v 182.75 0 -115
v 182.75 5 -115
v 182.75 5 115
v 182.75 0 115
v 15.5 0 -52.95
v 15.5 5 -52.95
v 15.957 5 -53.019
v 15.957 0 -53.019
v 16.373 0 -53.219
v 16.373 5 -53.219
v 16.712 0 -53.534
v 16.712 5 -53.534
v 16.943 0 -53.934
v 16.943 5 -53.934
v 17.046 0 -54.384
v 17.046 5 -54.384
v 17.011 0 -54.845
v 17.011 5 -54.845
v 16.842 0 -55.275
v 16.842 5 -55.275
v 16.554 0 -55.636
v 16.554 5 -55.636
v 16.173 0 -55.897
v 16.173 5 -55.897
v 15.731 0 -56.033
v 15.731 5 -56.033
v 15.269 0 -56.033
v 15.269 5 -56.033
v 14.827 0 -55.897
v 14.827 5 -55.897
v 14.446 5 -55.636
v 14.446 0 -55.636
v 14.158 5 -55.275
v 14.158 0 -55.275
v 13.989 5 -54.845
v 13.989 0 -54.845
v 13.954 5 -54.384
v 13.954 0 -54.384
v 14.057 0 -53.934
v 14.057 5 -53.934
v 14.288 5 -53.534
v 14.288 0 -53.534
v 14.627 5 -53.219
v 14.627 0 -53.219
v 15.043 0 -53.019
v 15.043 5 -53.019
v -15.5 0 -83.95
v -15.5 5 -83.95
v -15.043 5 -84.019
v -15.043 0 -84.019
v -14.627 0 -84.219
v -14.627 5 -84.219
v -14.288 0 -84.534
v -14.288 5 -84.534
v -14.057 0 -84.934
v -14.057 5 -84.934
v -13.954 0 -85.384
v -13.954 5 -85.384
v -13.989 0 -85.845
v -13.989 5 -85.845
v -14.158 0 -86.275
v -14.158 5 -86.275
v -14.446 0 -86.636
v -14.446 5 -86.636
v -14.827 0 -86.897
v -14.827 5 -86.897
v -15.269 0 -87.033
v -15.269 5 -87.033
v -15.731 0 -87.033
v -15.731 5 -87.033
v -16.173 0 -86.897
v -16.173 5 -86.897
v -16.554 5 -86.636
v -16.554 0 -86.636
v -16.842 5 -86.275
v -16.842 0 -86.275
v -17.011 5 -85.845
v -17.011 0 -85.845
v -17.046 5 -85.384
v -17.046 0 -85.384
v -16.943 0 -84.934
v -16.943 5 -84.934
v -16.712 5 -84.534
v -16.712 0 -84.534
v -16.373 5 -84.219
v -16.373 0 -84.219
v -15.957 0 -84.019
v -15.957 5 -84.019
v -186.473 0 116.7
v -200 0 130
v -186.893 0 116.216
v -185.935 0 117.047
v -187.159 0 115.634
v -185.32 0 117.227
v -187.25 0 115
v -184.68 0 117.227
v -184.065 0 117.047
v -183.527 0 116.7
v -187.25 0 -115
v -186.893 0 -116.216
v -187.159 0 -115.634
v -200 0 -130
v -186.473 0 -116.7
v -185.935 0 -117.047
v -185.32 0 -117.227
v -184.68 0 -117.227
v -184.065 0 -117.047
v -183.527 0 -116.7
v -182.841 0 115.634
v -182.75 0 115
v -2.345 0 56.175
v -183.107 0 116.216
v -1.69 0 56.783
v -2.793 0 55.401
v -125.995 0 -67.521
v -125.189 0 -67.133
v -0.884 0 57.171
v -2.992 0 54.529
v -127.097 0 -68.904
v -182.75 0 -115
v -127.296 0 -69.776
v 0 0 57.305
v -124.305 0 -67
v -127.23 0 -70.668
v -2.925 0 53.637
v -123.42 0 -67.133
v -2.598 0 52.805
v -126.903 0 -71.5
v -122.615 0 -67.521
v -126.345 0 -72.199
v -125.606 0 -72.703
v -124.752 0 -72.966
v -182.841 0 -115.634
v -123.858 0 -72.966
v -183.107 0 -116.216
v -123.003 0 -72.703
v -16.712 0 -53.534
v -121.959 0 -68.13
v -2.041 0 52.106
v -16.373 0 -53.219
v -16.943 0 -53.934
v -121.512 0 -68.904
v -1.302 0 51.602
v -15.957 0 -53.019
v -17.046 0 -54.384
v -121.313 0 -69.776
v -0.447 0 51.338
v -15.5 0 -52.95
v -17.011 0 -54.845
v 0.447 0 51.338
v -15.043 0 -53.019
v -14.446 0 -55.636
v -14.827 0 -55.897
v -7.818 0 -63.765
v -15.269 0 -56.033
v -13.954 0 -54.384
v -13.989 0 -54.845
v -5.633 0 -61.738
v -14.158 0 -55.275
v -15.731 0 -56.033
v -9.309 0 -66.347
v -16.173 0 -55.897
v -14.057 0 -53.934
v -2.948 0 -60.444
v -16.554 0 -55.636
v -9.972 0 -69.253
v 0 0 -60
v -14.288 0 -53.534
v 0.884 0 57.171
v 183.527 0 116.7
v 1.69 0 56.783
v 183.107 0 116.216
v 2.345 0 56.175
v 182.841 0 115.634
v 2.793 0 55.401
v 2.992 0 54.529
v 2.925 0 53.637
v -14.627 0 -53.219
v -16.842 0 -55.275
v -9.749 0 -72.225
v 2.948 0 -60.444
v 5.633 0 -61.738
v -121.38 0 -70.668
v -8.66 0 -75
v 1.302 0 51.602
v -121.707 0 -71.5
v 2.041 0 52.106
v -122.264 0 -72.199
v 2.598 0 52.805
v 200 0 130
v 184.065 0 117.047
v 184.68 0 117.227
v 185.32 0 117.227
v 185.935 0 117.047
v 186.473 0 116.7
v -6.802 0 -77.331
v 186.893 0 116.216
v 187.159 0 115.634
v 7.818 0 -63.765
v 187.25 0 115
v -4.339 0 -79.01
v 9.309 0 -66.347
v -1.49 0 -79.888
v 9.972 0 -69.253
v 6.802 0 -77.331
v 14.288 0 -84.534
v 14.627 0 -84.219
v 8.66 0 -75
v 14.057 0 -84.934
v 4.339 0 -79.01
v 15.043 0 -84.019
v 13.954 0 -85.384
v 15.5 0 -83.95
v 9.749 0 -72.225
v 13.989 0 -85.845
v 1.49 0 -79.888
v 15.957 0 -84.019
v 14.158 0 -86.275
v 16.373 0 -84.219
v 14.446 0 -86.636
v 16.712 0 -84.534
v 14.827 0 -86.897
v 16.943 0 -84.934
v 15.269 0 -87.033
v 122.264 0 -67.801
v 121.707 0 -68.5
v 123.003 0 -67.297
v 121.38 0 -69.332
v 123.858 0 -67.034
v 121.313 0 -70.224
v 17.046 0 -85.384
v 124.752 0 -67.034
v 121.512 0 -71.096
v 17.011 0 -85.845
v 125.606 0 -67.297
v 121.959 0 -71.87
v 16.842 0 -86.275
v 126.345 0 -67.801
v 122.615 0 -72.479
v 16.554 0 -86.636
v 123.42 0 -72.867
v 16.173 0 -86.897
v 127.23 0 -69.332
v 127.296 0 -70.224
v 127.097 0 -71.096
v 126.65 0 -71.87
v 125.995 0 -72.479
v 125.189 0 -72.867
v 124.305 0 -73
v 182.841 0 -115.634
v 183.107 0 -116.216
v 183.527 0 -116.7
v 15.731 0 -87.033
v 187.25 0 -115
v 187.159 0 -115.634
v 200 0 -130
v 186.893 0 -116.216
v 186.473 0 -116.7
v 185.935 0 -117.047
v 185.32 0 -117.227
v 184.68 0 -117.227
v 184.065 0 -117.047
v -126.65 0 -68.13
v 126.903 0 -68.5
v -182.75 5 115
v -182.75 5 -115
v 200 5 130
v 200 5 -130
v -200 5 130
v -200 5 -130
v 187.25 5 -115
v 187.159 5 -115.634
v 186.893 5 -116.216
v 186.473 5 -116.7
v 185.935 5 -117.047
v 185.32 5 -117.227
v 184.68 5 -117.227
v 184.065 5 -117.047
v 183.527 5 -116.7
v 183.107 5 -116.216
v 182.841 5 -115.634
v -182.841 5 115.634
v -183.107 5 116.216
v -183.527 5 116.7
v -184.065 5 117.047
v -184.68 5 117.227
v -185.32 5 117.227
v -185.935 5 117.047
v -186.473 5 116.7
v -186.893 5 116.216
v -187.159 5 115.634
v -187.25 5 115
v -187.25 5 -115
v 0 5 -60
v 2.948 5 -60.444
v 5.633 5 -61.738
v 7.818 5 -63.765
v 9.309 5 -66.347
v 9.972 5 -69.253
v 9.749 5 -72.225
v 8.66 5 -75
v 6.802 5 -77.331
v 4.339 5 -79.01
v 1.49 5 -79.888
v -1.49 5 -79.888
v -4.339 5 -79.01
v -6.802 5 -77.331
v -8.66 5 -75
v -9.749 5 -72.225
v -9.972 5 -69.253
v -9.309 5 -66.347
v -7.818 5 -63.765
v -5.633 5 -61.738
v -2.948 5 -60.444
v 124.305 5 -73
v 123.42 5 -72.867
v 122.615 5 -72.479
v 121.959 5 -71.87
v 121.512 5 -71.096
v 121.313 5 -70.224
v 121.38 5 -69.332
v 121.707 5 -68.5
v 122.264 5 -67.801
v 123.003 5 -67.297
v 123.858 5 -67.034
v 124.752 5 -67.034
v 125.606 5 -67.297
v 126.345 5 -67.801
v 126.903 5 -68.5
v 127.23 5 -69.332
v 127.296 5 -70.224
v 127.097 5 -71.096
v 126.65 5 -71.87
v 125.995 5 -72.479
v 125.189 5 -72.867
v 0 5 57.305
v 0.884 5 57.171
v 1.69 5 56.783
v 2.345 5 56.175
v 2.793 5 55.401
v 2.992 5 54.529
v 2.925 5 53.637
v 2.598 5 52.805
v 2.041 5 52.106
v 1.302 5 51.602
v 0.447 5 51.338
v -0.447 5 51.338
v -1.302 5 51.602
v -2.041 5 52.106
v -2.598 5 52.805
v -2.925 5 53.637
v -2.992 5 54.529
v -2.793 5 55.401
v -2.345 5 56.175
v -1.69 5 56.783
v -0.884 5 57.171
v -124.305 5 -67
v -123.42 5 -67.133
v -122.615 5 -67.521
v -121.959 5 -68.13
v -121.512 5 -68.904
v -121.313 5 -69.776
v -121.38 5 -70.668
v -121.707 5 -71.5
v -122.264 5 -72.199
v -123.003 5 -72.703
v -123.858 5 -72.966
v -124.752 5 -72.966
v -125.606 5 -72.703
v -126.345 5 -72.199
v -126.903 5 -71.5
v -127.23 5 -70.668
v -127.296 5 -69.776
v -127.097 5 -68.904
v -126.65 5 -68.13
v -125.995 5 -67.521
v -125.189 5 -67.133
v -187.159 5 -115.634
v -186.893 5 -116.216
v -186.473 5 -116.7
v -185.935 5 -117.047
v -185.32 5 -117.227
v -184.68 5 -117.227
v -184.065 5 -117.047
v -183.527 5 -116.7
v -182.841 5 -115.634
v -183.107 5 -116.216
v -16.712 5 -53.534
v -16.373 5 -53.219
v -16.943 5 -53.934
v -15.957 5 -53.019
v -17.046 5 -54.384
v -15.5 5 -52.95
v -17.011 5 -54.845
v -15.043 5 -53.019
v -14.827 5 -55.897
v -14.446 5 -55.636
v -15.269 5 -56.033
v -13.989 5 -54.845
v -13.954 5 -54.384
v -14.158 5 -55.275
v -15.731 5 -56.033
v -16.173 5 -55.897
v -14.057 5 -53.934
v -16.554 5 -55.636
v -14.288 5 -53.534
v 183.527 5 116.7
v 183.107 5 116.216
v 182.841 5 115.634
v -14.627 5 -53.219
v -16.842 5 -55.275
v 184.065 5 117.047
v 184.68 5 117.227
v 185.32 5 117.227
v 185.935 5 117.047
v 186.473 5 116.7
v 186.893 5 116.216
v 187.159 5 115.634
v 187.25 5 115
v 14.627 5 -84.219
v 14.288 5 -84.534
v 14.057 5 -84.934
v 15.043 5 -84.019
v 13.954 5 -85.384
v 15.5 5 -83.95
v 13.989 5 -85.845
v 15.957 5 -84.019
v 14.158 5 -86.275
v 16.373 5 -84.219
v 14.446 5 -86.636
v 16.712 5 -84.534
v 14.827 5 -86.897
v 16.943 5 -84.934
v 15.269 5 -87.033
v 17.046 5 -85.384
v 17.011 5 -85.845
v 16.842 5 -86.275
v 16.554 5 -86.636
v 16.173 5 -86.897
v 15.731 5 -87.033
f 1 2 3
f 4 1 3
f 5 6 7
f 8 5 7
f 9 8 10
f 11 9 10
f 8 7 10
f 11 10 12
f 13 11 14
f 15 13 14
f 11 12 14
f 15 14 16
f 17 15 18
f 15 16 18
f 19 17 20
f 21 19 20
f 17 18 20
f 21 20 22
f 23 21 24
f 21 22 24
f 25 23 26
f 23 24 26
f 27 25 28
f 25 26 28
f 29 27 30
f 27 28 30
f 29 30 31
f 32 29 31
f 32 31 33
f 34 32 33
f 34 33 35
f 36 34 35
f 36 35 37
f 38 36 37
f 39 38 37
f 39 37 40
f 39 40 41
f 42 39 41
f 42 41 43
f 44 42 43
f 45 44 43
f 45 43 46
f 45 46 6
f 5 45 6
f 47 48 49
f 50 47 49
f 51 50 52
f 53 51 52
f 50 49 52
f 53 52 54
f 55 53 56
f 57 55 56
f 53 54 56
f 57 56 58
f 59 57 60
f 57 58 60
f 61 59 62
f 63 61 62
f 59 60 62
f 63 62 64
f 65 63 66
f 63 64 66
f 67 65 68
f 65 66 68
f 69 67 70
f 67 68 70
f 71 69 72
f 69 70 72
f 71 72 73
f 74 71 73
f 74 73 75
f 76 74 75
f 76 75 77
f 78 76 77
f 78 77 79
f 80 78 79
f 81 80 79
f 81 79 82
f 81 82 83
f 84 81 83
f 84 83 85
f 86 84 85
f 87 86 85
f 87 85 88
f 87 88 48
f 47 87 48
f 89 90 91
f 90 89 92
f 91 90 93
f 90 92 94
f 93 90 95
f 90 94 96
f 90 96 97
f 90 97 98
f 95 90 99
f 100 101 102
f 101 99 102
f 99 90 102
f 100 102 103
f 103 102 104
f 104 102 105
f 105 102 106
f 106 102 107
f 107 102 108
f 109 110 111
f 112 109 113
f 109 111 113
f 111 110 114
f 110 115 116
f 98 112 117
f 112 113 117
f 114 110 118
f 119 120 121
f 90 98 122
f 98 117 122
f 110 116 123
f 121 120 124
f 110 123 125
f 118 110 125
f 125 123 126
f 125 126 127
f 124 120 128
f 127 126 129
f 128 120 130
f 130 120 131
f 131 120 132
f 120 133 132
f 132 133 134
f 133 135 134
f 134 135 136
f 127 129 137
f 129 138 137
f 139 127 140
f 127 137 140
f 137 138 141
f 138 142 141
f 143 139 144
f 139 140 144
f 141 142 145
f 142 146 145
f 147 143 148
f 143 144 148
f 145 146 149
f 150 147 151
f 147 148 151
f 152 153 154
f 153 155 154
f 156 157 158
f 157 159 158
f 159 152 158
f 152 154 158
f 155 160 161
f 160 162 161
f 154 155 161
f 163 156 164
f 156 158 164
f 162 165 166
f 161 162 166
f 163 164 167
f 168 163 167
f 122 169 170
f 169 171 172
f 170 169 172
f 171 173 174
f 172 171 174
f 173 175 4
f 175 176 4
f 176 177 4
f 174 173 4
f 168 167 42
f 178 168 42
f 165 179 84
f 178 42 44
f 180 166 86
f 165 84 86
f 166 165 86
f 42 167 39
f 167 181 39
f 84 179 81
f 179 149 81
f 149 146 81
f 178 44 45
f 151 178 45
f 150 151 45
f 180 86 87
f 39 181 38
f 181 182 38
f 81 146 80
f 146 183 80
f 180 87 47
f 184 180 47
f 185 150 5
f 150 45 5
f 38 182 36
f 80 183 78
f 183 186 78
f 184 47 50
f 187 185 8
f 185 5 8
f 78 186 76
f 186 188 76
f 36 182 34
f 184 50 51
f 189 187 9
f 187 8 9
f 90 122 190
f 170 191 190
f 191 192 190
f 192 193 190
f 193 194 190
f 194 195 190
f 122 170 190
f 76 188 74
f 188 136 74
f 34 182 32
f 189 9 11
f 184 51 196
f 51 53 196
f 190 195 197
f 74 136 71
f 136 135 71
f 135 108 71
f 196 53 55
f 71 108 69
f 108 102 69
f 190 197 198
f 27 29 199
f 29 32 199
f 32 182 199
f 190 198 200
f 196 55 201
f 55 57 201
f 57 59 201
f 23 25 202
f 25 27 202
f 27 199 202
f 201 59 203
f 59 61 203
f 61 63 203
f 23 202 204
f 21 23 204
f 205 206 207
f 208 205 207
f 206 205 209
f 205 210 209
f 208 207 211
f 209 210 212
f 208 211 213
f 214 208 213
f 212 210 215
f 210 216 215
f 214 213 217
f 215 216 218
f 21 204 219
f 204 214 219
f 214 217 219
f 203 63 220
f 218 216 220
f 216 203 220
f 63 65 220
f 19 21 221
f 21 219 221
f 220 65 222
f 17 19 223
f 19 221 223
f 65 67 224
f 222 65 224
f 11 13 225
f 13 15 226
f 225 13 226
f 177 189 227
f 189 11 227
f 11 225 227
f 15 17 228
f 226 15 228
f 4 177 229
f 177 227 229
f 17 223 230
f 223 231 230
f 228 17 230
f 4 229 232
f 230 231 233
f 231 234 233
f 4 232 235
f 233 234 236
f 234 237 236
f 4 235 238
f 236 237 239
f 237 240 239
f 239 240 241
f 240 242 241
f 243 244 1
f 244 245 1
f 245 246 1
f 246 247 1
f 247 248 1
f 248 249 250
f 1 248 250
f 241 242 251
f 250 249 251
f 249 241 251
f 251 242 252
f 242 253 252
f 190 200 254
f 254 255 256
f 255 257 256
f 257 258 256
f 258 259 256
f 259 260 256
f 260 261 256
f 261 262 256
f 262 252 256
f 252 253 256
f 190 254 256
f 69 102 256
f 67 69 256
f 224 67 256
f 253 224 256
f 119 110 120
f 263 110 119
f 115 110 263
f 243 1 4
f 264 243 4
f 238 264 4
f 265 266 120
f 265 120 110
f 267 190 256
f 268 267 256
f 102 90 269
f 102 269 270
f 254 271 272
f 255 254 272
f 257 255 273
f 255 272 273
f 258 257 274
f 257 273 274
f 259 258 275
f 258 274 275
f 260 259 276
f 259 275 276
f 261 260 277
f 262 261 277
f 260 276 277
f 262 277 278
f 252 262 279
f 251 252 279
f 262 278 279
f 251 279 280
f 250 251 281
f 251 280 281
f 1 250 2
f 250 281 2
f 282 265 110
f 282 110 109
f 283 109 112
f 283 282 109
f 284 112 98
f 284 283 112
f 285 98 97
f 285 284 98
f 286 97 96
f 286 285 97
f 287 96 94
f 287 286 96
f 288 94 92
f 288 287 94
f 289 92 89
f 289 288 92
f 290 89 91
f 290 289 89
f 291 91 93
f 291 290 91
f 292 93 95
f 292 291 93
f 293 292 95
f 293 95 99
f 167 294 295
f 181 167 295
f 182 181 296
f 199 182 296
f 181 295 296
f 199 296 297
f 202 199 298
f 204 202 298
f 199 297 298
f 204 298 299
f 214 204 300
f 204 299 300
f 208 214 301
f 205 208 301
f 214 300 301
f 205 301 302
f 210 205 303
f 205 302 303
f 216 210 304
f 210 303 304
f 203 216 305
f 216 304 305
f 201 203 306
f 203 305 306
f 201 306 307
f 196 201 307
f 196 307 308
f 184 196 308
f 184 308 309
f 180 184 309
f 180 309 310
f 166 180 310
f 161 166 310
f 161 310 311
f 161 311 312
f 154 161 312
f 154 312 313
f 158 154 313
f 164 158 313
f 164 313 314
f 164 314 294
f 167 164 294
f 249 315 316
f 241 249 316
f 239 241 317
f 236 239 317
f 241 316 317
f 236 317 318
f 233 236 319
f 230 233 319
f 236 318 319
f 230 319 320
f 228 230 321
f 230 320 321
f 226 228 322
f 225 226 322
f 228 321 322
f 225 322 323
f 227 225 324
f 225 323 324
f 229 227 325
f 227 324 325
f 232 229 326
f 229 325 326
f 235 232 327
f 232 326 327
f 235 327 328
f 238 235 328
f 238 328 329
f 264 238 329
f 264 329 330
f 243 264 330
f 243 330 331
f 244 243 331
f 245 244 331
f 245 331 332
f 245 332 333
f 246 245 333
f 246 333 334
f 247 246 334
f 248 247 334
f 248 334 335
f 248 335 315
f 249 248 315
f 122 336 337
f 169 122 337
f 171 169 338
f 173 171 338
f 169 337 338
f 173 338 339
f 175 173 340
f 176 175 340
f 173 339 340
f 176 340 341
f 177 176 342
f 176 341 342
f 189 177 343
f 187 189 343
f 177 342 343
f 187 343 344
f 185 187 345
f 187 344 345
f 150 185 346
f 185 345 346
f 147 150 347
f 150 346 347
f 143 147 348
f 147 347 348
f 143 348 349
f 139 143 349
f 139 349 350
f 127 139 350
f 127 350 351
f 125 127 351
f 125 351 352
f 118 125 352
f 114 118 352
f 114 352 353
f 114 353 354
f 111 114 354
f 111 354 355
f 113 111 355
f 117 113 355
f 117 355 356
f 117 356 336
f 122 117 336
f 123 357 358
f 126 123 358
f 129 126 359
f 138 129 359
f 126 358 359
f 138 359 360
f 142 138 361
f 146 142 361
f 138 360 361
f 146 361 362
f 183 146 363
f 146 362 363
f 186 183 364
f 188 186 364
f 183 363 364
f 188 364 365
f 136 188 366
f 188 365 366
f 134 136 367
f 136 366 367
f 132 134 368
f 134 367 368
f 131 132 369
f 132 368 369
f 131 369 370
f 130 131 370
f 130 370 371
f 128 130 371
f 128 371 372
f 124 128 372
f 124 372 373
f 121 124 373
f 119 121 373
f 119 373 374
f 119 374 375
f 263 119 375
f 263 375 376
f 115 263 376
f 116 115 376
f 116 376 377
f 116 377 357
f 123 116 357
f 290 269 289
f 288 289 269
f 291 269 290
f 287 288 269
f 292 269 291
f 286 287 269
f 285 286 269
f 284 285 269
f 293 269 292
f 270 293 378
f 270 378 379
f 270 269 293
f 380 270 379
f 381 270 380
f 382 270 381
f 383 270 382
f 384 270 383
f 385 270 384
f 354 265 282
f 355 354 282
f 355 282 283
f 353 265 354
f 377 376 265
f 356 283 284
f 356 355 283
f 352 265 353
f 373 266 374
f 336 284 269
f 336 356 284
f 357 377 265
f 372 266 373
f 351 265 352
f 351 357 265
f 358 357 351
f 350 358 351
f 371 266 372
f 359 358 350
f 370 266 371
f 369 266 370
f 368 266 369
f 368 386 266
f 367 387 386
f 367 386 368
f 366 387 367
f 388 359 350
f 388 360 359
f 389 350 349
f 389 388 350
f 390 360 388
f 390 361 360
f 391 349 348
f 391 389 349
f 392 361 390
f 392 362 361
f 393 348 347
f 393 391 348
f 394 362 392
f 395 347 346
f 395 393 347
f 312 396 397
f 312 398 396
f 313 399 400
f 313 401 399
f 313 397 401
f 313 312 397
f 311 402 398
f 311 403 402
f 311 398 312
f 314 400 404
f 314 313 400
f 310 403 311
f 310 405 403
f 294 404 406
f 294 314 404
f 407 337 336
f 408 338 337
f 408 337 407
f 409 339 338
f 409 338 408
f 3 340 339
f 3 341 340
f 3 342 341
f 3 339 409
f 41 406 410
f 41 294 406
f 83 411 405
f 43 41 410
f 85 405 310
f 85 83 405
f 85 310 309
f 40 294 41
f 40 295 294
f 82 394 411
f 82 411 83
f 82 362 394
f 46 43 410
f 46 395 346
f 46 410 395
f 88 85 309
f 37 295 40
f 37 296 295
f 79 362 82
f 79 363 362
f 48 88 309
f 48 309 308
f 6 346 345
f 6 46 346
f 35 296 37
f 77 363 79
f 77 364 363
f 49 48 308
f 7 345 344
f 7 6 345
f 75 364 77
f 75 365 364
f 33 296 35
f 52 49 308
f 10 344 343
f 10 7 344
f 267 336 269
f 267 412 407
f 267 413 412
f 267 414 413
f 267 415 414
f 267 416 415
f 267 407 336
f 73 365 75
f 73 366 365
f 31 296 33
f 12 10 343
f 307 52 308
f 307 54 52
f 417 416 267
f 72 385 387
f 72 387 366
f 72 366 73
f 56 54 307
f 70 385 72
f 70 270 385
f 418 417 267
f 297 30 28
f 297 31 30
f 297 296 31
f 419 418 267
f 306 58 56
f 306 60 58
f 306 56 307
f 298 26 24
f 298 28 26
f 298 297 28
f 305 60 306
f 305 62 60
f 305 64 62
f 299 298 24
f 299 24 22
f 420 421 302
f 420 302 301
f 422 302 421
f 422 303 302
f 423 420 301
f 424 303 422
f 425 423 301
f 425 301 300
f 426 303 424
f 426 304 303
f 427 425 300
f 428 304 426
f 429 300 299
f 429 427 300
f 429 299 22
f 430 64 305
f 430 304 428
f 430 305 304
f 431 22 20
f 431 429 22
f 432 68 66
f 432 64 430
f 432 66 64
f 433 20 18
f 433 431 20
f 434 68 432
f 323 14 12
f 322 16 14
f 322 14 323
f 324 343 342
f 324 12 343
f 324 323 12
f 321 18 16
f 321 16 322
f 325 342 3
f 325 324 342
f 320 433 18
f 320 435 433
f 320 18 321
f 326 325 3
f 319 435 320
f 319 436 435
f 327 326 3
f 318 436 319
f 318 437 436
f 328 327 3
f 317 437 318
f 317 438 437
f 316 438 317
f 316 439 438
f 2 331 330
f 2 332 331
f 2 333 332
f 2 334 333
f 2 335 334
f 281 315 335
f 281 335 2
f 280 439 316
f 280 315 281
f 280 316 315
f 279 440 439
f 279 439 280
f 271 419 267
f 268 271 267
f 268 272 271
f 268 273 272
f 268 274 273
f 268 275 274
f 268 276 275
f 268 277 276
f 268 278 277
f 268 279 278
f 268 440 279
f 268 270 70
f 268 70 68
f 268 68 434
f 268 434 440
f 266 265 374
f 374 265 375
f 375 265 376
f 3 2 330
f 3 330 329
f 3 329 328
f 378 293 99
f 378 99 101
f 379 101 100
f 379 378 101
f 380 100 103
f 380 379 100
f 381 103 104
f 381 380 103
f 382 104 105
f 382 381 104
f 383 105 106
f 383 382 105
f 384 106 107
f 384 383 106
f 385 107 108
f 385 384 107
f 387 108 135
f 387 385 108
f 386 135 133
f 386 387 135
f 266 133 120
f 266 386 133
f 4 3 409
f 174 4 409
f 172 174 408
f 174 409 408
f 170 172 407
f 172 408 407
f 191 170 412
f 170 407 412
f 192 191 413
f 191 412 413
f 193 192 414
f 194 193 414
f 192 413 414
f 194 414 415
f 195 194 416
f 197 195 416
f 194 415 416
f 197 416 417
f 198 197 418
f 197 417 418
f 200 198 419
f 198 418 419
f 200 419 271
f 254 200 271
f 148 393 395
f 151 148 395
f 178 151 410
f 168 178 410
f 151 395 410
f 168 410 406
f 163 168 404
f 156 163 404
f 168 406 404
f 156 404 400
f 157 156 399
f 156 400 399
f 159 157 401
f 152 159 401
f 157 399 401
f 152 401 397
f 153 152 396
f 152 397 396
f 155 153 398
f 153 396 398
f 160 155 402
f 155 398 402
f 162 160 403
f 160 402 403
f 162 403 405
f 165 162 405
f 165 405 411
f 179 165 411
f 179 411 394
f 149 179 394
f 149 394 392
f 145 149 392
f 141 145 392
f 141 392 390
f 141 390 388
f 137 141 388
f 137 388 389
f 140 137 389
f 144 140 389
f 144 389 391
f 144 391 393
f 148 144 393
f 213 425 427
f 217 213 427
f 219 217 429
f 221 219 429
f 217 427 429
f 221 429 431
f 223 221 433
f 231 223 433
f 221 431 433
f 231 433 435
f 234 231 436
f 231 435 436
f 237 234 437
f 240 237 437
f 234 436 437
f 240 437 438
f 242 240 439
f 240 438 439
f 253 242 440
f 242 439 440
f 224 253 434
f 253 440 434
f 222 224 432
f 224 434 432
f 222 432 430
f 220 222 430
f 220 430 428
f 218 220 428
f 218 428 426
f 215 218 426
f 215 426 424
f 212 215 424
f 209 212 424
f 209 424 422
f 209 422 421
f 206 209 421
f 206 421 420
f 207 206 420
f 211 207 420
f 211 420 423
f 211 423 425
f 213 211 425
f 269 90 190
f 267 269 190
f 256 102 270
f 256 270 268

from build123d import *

# Parameters (mm, degrees)
SKETCH_1_W          = 400
SKETCH_1_H          = 260
EXTRUDE_1_DEPTH     = 5
CUT_EXTRUDE_1_DEPTH = 239.589605809
SKETCH_3_R          = 1.55
SKETCH_3_R_2        = 10
SKETCH_3_R_3        = 3
CUT_EXTRUDE_2_DEPTH = 239.589605809


with BuildPart() as part:
    # 草圖1 → 填料-伸長1 (new body)
    with BuildSketch(Plane(origin=(0, 0, 0), x_dir=(1, 0, 0), z_dir=(0, 1, 0))):
        Rectangle(SKETCH_1_W, SKETCH_1_H)
    extrude(amount=EXTRUDE_1_DEPTH)

    # 草圖2 → 除料-伸長1 (cut, through all)
    with BuildSketch(Plane(origin=(0, 5, 0), x_dir=(1, 0, 0), z_dir=(0, 1, 0))):
        with BuildLine():
            Line((-182.75, 115), (-182.75, -115))
            ThreePointArc((-182.75, -115), (-185, -117.25), (-187.25, -115))
            Line((-187.25, -115), (-187.25, 115))
            ThreePointArc((-187.25, 115), (-185, 117.25), (-182.75, 115))
        make_face()
        with BuildLine():
            Line((182.75, 115), (182.75, -115))
            ThreePointArc((182.75, -115), (185, -117.25), (187.25, -115))
            Line((187.25, -115), (187.25, 115))
            ThreePointArc((187.25, 115), (185, 117.25), (182.75, 115))
        make_face()
    extrude(amount=-CUT_EXTRUDE_1_DEPTH, mode=Mode.SUBTRACT)

    # 草圖3 → 除料-伸長2 (cut, through all)
    with BuildSketch(Plane(origin=(0, 5, 0), x_dir=(1, 0, 0), z_dir=(0, 1, 0))):
        with Locations(Location((-15.5, 85.5, 0), (0, 0, 270))):
            Circle(SKETCH_3_R)
        with Locations(Location((15.5, 85.5, 0), (0, 0, 270))):
            Circle(SKETCH_3_R)
        with Locations(Location((-15.5, 54.5, 0), (0, 0, 270))):
            Circle(SKETCH_3_R)
        with Locations(Location((15.5, 54.5, 0), (0, 0, 270))):
            Circle(SKETCH_3_R)
        with Locations(Location((0, 70, 0), (0, 0, 270))):
            Circle(SKETCH_3_R_2)
        with Locations(Location((-124.304765272, 70, 0), (0, 0, 270))):
            Circle(SKETCH_3_R_3)
        with Locations(Location((124.304765272, 70, 0), (0, 0, 90))):
            Circle(SKETCH_3_R_3)
        with Locations(Location((0, -54.304765272, 0), (0, 0, 270))):
            Circle(SKETCH_3_R_3)
    extrude(amount=-CUT_EXTRUDE_2_DEPTH, mode=Mode.SUBTRACT)


solid = part.part
